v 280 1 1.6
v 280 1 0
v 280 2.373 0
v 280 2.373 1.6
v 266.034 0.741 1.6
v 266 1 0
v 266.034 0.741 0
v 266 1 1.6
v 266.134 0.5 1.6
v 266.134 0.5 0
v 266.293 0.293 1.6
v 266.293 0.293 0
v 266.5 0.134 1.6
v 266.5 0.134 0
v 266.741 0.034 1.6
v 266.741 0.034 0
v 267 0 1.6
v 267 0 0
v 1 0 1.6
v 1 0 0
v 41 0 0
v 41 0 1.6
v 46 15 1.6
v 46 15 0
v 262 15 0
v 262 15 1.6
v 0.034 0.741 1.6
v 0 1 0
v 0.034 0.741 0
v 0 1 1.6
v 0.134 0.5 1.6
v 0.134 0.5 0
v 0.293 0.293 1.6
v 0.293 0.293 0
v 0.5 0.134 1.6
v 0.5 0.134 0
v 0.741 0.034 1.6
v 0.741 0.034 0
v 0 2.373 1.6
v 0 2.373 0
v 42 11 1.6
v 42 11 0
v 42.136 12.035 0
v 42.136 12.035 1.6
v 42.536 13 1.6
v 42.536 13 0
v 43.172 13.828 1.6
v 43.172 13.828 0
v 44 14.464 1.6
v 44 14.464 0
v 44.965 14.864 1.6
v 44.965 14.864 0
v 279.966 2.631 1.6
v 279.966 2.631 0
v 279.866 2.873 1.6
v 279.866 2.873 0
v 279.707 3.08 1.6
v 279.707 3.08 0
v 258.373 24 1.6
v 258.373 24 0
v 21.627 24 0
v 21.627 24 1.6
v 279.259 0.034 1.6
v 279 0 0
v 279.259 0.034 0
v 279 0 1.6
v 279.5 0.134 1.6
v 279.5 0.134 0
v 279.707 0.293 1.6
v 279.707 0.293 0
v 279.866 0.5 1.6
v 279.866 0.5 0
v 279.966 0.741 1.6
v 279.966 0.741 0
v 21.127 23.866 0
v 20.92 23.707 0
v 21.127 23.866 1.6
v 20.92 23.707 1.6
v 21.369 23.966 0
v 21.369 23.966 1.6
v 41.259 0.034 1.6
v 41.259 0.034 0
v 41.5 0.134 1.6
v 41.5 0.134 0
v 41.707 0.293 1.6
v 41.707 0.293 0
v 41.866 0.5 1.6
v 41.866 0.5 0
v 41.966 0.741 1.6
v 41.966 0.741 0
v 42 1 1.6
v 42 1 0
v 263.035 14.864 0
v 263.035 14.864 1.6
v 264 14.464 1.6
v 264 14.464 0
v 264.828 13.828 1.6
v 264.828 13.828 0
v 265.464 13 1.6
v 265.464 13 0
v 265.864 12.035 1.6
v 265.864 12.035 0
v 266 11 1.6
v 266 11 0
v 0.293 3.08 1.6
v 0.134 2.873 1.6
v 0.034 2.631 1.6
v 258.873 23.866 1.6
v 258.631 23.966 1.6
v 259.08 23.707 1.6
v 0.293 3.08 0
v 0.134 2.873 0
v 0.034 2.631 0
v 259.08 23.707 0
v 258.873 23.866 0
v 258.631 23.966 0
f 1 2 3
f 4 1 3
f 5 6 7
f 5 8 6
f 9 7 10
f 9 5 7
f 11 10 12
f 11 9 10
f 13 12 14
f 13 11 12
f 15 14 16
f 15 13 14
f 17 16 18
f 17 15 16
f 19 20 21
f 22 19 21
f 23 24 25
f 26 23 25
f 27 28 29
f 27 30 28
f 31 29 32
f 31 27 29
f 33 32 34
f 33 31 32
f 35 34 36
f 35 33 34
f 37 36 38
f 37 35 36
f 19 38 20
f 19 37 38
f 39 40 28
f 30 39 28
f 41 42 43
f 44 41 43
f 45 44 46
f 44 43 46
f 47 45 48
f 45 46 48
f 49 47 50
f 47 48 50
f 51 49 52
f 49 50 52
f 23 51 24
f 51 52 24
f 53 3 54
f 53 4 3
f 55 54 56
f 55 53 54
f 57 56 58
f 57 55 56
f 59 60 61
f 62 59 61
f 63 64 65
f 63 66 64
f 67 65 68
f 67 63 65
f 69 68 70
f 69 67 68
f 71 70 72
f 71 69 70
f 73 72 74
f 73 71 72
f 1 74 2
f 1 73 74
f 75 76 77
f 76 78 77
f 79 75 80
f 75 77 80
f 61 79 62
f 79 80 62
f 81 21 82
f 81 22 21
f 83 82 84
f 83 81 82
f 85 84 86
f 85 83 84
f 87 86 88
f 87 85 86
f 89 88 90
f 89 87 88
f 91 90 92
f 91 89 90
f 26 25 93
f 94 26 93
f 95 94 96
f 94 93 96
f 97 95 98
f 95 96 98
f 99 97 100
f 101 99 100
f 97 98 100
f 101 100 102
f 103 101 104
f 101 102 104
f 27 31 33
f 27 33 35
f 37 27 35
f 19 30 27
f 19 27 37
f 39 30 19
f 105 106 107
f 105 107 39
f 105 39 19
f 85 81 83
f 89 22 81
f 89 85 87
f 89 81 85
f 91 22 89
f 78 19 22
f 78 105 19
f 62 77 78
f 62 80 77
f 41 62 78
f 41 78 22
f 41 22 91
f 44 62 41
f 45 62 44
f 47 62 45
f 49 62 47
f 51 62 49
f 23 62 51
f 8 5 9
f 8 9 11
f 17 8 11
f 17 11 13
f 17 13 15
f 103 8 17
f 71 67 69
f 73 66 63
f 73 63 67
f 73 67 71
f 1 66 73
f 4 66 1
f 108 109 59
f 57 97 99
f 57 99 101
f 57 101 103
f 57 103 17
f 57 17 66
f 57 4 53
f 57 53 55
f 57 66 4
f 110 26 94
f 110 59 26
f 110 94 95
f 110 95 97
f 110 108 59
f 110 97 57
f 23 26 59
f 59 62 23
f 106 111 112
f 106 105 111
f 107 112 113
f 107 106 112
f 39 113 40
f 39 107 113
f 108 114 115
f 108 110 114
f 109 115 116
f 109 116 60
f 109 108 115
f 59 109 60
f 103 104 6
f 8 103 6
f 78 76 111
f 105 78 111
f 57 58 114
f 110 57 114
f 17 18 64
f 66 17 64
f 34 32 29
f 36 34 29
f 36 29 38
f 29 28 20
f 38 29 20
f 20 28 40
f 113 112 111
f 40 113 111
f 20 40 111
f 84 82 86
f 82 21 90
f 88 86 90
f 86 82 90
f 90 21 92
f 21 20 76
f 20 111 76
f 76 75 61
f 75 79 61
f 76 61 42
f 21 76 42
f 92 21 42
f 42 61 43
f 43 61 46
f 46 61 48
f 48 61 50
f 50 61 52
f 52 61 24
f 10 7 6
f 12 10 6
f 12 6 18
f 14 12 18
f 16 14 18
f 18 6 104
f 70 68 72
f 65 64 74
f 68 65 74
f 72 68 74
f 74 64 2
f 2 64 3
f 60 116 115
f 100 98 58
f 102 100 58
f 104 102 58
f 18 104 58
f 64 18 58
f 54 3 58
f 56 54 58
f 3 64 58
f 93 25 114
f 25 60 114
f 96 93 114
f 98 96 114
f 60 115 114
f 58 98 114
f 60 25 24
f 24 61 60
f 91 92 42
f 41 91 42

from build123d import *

# Parameters (mm, degrees)
BOSS_EXTRUDE1_DEPTH = 1.6
FILLET1_R           = 1


with BuildPart() as part:
    # Sketch1 → Boss-Extrude1 (new body)
    with BuildSketch(Plane.XY):
        with BuildLine():
            Line((21.213203436, 24), (0, 2.786796564))
            Line((0, 2.786796564), (0, 0))
            Line((0, 0), (42, 0))
            Line((42, 0), (42, 11))
            ThreePointArc((42, 11), (43.171572875, 13.828427125), (46, 15))
            Line((46, 15), (262, 15))
            ThreePointArc((262, 15), (264.828427125, 13.828427125), (266, 11))
            Line((266, 11), (266, 0))
            Line((266, 0), (280, 0))
            Line((280, 0), (280, 2.786796564))
            Line((280, 2.786796564), (258.786796564, 24))
            Line((258.786796564, 24), (21.213203436, 24))
        make_face()
    extrude(amount=BOSS_EXTRUDE1_DEPTH)

    # Fillet1
    fillet1_edges = [part.edges().sort_by_distance(p)[0] for p in [
        (42, 0, 0.8),
        (0, 0, 0.8),
        (0, 2.786796564, 0.8),
        (21.213203436, 24, 0.8),
        (258.786796564, 24, 0.8),
        (280, 2.786796564, 0.8),
        (280, 0, 0.8),
        (266, 0, 0.8),
    ]]
    fillet(fillet1_edges, radius=FILLET1_R)


solid = part.part
